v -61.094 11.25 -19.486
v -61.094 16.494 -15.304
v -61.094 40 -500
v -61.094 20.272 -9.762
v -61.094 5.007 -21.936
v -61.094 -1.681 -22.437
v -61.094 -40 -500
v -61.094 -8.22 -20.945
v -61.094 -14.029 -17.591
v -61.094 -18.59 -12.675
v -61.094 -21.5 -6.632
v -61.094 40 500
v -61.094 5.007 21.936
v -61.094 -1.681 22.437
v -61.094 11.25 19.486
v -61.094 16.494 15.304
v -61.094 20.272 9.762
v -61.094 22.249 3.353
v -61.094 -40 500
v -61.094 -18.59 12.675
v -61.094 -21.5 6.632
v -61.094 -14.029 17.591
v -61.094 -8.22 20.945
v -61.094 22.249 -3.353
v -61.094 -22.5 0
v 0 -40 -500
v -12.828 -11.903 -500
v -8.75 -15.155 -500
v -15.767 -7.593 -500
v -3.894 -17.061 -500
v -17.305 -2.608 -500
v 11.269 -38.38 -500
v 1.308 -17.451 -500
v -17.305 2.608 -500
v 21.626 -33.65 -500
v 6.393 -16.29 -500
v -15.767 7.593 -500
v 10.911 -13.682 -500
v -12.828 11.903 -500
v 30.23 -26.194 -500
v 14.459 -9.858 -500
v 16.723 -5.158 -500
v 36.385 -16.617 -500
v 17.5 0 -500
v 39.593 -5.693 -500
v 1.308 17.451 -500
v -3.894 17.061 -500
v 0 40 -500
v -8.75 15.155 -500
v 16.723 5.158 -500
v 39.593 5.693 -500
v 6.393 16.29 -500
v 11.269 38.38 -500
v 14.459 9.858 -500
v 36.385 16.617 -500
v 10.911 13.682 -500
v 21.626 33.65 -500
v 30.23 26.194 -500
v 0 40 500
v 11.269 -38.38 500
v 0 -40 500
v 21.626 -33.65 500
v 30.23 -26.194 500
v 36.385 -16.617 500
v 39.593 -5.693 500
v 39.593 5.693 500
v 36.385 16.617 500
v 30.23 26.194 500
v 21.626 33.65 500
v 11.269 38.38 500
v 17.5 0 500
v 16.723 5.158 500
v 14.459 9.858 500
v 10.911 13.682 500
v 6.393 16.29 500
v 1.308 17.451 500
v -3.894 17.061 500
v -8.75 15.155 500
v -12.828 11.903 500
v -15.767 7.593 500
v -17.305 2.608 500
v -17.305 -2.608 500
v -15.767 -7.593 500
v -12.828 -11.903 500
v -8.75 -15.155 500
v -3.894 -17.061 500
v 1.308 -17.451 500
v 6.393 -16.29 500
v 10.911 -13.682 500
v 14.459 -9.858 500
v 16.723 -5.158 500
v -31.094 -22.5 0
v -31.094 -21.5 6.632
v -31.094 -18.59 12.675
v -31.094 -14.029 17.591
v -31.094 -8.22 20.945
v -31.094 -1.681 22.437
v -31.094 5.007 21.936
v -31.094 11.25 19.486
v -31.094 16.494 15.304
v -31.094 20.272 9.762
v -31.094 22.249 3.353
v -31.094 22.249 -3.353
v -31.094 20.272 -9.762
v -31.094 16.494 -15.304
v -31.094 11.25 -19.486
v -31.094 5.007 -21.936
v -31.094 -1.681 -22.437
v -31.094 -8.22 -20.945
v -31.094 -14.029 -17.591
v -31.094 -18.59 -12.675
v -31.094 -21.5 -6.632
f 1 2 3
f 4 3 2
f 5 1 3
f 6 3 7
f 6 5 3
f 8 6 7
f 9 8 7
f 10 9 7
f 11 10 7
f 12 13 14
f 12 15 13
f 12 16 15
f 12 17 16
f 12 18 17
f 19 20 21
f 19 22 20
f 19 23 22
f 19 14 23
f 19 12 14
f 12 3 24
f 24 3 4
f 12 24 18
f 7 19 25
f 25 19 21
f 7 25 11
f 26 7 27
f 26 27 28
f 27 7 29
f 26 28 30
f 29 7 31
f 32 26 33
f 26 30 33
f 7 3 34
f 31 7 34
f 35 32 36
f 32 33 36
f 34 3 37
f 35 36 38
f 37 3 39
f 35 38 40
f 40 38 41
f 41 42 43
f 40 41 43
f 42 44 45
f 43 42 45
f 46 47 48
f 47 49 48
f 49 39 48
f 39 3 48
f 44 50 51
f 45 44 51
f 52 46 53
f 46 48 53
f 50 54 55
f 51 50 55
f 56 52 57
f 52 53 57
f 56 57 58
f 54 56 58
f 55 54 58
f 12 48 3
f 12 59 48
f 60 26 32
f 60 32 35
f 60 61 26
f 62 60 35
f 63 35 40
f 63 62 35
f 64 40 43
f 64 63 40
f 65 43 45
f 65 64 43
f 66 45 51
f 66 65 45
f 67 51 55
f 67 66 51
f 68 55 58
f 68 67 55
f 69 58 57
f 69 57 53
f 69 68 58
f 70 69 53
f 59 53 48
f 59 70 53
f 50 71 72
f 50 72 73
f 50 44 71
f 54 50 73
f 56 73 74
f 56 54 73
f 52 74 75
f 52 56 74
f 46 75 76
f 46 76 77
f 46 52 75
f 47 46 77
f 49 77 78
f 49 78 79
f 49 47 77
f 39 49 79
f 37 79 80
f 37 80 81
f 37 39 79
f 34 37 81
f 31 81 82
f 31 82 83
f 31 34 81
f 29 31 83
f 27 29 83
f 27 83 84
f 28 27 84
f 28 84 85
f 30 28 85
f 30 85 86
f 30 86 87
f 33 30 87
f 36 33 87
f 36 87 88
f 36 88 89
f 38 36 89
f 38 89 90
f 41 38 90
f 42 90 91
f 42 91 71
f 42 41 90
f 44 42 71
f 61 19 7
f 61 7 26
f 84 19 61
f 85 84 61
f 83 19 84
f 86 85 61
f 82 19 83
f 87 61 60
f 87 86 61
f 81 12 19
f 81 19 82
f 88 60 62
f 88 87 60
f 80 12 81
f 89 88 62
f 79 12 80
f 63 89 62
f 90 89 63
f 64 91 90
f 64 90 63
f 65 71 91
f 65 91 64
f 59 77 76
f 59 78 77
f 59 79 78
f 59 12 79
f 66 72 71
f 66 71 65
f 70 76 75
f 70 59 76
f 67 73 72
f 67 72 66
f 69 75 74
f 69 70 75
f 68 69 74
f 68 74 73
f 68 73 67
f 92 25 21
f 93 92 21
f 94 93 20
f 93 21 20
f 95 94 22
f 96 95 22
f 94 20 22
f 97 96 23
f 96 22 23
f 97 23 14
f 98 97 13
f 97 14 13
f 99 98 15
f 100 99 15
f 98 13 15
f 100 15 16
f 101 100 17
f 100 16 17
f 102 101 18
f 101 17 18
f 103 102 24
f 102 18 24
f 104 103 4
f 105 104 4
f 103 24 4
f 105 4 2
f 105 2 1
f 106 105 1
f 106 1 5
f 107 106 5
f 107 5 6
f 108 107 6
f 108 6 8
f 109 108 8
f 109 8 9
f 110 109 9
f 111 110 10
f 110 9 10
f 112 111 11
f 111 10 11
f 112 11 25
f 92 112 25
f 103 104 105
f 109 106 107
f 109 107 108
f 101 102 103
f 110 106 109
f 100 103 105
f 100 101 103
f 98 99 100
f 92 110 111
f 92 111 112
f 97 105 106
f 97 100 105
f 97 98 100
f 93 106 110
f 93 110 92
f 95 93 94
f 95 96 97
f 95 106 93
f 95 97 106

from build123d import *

# Parameters (mm, degrees)
SKETCH1_R           = 17.5
BOSS_EXTRUDE1_DEPTH = 500
SKETCH2_R           = 22.5
CUT_EXTRUDE1_DEPTH  = 30


with BuildPart() as part:
    # Sketch1 → Boss-Extrude1 (new, symmetric)
    with BuildSketch(Plane.XY):
        with BuildLine():
            Line((0, 40), (-61.093968567, 40))
            Line((-61.093968567, 40), (-61.093968567, -40))
            Line((-61.093968567, -40), (0, -40))
            ThreePointArc((0, -40), (40, 0), (0, 40))
        make_face()
        Circle(SKETCH1_R, mode=Mode.SUBTRACT)
    extrude(amount=BOSS_EXTRUDE1_DEPTH, both=True)

    # Sketch2 → Cut-Extrude1 (cut)
    with BuildSketch(Plane.ZY.offset(61.093968567)):
        with Locations(Location((0, 0, 0), (0, 0, 270))):
            Circle(SKETCH2_R)
    extrude(amount=-CUT_EXTRUDE1_DEPTH, mode=Mode.SUBTRACT)


solid = part.part
